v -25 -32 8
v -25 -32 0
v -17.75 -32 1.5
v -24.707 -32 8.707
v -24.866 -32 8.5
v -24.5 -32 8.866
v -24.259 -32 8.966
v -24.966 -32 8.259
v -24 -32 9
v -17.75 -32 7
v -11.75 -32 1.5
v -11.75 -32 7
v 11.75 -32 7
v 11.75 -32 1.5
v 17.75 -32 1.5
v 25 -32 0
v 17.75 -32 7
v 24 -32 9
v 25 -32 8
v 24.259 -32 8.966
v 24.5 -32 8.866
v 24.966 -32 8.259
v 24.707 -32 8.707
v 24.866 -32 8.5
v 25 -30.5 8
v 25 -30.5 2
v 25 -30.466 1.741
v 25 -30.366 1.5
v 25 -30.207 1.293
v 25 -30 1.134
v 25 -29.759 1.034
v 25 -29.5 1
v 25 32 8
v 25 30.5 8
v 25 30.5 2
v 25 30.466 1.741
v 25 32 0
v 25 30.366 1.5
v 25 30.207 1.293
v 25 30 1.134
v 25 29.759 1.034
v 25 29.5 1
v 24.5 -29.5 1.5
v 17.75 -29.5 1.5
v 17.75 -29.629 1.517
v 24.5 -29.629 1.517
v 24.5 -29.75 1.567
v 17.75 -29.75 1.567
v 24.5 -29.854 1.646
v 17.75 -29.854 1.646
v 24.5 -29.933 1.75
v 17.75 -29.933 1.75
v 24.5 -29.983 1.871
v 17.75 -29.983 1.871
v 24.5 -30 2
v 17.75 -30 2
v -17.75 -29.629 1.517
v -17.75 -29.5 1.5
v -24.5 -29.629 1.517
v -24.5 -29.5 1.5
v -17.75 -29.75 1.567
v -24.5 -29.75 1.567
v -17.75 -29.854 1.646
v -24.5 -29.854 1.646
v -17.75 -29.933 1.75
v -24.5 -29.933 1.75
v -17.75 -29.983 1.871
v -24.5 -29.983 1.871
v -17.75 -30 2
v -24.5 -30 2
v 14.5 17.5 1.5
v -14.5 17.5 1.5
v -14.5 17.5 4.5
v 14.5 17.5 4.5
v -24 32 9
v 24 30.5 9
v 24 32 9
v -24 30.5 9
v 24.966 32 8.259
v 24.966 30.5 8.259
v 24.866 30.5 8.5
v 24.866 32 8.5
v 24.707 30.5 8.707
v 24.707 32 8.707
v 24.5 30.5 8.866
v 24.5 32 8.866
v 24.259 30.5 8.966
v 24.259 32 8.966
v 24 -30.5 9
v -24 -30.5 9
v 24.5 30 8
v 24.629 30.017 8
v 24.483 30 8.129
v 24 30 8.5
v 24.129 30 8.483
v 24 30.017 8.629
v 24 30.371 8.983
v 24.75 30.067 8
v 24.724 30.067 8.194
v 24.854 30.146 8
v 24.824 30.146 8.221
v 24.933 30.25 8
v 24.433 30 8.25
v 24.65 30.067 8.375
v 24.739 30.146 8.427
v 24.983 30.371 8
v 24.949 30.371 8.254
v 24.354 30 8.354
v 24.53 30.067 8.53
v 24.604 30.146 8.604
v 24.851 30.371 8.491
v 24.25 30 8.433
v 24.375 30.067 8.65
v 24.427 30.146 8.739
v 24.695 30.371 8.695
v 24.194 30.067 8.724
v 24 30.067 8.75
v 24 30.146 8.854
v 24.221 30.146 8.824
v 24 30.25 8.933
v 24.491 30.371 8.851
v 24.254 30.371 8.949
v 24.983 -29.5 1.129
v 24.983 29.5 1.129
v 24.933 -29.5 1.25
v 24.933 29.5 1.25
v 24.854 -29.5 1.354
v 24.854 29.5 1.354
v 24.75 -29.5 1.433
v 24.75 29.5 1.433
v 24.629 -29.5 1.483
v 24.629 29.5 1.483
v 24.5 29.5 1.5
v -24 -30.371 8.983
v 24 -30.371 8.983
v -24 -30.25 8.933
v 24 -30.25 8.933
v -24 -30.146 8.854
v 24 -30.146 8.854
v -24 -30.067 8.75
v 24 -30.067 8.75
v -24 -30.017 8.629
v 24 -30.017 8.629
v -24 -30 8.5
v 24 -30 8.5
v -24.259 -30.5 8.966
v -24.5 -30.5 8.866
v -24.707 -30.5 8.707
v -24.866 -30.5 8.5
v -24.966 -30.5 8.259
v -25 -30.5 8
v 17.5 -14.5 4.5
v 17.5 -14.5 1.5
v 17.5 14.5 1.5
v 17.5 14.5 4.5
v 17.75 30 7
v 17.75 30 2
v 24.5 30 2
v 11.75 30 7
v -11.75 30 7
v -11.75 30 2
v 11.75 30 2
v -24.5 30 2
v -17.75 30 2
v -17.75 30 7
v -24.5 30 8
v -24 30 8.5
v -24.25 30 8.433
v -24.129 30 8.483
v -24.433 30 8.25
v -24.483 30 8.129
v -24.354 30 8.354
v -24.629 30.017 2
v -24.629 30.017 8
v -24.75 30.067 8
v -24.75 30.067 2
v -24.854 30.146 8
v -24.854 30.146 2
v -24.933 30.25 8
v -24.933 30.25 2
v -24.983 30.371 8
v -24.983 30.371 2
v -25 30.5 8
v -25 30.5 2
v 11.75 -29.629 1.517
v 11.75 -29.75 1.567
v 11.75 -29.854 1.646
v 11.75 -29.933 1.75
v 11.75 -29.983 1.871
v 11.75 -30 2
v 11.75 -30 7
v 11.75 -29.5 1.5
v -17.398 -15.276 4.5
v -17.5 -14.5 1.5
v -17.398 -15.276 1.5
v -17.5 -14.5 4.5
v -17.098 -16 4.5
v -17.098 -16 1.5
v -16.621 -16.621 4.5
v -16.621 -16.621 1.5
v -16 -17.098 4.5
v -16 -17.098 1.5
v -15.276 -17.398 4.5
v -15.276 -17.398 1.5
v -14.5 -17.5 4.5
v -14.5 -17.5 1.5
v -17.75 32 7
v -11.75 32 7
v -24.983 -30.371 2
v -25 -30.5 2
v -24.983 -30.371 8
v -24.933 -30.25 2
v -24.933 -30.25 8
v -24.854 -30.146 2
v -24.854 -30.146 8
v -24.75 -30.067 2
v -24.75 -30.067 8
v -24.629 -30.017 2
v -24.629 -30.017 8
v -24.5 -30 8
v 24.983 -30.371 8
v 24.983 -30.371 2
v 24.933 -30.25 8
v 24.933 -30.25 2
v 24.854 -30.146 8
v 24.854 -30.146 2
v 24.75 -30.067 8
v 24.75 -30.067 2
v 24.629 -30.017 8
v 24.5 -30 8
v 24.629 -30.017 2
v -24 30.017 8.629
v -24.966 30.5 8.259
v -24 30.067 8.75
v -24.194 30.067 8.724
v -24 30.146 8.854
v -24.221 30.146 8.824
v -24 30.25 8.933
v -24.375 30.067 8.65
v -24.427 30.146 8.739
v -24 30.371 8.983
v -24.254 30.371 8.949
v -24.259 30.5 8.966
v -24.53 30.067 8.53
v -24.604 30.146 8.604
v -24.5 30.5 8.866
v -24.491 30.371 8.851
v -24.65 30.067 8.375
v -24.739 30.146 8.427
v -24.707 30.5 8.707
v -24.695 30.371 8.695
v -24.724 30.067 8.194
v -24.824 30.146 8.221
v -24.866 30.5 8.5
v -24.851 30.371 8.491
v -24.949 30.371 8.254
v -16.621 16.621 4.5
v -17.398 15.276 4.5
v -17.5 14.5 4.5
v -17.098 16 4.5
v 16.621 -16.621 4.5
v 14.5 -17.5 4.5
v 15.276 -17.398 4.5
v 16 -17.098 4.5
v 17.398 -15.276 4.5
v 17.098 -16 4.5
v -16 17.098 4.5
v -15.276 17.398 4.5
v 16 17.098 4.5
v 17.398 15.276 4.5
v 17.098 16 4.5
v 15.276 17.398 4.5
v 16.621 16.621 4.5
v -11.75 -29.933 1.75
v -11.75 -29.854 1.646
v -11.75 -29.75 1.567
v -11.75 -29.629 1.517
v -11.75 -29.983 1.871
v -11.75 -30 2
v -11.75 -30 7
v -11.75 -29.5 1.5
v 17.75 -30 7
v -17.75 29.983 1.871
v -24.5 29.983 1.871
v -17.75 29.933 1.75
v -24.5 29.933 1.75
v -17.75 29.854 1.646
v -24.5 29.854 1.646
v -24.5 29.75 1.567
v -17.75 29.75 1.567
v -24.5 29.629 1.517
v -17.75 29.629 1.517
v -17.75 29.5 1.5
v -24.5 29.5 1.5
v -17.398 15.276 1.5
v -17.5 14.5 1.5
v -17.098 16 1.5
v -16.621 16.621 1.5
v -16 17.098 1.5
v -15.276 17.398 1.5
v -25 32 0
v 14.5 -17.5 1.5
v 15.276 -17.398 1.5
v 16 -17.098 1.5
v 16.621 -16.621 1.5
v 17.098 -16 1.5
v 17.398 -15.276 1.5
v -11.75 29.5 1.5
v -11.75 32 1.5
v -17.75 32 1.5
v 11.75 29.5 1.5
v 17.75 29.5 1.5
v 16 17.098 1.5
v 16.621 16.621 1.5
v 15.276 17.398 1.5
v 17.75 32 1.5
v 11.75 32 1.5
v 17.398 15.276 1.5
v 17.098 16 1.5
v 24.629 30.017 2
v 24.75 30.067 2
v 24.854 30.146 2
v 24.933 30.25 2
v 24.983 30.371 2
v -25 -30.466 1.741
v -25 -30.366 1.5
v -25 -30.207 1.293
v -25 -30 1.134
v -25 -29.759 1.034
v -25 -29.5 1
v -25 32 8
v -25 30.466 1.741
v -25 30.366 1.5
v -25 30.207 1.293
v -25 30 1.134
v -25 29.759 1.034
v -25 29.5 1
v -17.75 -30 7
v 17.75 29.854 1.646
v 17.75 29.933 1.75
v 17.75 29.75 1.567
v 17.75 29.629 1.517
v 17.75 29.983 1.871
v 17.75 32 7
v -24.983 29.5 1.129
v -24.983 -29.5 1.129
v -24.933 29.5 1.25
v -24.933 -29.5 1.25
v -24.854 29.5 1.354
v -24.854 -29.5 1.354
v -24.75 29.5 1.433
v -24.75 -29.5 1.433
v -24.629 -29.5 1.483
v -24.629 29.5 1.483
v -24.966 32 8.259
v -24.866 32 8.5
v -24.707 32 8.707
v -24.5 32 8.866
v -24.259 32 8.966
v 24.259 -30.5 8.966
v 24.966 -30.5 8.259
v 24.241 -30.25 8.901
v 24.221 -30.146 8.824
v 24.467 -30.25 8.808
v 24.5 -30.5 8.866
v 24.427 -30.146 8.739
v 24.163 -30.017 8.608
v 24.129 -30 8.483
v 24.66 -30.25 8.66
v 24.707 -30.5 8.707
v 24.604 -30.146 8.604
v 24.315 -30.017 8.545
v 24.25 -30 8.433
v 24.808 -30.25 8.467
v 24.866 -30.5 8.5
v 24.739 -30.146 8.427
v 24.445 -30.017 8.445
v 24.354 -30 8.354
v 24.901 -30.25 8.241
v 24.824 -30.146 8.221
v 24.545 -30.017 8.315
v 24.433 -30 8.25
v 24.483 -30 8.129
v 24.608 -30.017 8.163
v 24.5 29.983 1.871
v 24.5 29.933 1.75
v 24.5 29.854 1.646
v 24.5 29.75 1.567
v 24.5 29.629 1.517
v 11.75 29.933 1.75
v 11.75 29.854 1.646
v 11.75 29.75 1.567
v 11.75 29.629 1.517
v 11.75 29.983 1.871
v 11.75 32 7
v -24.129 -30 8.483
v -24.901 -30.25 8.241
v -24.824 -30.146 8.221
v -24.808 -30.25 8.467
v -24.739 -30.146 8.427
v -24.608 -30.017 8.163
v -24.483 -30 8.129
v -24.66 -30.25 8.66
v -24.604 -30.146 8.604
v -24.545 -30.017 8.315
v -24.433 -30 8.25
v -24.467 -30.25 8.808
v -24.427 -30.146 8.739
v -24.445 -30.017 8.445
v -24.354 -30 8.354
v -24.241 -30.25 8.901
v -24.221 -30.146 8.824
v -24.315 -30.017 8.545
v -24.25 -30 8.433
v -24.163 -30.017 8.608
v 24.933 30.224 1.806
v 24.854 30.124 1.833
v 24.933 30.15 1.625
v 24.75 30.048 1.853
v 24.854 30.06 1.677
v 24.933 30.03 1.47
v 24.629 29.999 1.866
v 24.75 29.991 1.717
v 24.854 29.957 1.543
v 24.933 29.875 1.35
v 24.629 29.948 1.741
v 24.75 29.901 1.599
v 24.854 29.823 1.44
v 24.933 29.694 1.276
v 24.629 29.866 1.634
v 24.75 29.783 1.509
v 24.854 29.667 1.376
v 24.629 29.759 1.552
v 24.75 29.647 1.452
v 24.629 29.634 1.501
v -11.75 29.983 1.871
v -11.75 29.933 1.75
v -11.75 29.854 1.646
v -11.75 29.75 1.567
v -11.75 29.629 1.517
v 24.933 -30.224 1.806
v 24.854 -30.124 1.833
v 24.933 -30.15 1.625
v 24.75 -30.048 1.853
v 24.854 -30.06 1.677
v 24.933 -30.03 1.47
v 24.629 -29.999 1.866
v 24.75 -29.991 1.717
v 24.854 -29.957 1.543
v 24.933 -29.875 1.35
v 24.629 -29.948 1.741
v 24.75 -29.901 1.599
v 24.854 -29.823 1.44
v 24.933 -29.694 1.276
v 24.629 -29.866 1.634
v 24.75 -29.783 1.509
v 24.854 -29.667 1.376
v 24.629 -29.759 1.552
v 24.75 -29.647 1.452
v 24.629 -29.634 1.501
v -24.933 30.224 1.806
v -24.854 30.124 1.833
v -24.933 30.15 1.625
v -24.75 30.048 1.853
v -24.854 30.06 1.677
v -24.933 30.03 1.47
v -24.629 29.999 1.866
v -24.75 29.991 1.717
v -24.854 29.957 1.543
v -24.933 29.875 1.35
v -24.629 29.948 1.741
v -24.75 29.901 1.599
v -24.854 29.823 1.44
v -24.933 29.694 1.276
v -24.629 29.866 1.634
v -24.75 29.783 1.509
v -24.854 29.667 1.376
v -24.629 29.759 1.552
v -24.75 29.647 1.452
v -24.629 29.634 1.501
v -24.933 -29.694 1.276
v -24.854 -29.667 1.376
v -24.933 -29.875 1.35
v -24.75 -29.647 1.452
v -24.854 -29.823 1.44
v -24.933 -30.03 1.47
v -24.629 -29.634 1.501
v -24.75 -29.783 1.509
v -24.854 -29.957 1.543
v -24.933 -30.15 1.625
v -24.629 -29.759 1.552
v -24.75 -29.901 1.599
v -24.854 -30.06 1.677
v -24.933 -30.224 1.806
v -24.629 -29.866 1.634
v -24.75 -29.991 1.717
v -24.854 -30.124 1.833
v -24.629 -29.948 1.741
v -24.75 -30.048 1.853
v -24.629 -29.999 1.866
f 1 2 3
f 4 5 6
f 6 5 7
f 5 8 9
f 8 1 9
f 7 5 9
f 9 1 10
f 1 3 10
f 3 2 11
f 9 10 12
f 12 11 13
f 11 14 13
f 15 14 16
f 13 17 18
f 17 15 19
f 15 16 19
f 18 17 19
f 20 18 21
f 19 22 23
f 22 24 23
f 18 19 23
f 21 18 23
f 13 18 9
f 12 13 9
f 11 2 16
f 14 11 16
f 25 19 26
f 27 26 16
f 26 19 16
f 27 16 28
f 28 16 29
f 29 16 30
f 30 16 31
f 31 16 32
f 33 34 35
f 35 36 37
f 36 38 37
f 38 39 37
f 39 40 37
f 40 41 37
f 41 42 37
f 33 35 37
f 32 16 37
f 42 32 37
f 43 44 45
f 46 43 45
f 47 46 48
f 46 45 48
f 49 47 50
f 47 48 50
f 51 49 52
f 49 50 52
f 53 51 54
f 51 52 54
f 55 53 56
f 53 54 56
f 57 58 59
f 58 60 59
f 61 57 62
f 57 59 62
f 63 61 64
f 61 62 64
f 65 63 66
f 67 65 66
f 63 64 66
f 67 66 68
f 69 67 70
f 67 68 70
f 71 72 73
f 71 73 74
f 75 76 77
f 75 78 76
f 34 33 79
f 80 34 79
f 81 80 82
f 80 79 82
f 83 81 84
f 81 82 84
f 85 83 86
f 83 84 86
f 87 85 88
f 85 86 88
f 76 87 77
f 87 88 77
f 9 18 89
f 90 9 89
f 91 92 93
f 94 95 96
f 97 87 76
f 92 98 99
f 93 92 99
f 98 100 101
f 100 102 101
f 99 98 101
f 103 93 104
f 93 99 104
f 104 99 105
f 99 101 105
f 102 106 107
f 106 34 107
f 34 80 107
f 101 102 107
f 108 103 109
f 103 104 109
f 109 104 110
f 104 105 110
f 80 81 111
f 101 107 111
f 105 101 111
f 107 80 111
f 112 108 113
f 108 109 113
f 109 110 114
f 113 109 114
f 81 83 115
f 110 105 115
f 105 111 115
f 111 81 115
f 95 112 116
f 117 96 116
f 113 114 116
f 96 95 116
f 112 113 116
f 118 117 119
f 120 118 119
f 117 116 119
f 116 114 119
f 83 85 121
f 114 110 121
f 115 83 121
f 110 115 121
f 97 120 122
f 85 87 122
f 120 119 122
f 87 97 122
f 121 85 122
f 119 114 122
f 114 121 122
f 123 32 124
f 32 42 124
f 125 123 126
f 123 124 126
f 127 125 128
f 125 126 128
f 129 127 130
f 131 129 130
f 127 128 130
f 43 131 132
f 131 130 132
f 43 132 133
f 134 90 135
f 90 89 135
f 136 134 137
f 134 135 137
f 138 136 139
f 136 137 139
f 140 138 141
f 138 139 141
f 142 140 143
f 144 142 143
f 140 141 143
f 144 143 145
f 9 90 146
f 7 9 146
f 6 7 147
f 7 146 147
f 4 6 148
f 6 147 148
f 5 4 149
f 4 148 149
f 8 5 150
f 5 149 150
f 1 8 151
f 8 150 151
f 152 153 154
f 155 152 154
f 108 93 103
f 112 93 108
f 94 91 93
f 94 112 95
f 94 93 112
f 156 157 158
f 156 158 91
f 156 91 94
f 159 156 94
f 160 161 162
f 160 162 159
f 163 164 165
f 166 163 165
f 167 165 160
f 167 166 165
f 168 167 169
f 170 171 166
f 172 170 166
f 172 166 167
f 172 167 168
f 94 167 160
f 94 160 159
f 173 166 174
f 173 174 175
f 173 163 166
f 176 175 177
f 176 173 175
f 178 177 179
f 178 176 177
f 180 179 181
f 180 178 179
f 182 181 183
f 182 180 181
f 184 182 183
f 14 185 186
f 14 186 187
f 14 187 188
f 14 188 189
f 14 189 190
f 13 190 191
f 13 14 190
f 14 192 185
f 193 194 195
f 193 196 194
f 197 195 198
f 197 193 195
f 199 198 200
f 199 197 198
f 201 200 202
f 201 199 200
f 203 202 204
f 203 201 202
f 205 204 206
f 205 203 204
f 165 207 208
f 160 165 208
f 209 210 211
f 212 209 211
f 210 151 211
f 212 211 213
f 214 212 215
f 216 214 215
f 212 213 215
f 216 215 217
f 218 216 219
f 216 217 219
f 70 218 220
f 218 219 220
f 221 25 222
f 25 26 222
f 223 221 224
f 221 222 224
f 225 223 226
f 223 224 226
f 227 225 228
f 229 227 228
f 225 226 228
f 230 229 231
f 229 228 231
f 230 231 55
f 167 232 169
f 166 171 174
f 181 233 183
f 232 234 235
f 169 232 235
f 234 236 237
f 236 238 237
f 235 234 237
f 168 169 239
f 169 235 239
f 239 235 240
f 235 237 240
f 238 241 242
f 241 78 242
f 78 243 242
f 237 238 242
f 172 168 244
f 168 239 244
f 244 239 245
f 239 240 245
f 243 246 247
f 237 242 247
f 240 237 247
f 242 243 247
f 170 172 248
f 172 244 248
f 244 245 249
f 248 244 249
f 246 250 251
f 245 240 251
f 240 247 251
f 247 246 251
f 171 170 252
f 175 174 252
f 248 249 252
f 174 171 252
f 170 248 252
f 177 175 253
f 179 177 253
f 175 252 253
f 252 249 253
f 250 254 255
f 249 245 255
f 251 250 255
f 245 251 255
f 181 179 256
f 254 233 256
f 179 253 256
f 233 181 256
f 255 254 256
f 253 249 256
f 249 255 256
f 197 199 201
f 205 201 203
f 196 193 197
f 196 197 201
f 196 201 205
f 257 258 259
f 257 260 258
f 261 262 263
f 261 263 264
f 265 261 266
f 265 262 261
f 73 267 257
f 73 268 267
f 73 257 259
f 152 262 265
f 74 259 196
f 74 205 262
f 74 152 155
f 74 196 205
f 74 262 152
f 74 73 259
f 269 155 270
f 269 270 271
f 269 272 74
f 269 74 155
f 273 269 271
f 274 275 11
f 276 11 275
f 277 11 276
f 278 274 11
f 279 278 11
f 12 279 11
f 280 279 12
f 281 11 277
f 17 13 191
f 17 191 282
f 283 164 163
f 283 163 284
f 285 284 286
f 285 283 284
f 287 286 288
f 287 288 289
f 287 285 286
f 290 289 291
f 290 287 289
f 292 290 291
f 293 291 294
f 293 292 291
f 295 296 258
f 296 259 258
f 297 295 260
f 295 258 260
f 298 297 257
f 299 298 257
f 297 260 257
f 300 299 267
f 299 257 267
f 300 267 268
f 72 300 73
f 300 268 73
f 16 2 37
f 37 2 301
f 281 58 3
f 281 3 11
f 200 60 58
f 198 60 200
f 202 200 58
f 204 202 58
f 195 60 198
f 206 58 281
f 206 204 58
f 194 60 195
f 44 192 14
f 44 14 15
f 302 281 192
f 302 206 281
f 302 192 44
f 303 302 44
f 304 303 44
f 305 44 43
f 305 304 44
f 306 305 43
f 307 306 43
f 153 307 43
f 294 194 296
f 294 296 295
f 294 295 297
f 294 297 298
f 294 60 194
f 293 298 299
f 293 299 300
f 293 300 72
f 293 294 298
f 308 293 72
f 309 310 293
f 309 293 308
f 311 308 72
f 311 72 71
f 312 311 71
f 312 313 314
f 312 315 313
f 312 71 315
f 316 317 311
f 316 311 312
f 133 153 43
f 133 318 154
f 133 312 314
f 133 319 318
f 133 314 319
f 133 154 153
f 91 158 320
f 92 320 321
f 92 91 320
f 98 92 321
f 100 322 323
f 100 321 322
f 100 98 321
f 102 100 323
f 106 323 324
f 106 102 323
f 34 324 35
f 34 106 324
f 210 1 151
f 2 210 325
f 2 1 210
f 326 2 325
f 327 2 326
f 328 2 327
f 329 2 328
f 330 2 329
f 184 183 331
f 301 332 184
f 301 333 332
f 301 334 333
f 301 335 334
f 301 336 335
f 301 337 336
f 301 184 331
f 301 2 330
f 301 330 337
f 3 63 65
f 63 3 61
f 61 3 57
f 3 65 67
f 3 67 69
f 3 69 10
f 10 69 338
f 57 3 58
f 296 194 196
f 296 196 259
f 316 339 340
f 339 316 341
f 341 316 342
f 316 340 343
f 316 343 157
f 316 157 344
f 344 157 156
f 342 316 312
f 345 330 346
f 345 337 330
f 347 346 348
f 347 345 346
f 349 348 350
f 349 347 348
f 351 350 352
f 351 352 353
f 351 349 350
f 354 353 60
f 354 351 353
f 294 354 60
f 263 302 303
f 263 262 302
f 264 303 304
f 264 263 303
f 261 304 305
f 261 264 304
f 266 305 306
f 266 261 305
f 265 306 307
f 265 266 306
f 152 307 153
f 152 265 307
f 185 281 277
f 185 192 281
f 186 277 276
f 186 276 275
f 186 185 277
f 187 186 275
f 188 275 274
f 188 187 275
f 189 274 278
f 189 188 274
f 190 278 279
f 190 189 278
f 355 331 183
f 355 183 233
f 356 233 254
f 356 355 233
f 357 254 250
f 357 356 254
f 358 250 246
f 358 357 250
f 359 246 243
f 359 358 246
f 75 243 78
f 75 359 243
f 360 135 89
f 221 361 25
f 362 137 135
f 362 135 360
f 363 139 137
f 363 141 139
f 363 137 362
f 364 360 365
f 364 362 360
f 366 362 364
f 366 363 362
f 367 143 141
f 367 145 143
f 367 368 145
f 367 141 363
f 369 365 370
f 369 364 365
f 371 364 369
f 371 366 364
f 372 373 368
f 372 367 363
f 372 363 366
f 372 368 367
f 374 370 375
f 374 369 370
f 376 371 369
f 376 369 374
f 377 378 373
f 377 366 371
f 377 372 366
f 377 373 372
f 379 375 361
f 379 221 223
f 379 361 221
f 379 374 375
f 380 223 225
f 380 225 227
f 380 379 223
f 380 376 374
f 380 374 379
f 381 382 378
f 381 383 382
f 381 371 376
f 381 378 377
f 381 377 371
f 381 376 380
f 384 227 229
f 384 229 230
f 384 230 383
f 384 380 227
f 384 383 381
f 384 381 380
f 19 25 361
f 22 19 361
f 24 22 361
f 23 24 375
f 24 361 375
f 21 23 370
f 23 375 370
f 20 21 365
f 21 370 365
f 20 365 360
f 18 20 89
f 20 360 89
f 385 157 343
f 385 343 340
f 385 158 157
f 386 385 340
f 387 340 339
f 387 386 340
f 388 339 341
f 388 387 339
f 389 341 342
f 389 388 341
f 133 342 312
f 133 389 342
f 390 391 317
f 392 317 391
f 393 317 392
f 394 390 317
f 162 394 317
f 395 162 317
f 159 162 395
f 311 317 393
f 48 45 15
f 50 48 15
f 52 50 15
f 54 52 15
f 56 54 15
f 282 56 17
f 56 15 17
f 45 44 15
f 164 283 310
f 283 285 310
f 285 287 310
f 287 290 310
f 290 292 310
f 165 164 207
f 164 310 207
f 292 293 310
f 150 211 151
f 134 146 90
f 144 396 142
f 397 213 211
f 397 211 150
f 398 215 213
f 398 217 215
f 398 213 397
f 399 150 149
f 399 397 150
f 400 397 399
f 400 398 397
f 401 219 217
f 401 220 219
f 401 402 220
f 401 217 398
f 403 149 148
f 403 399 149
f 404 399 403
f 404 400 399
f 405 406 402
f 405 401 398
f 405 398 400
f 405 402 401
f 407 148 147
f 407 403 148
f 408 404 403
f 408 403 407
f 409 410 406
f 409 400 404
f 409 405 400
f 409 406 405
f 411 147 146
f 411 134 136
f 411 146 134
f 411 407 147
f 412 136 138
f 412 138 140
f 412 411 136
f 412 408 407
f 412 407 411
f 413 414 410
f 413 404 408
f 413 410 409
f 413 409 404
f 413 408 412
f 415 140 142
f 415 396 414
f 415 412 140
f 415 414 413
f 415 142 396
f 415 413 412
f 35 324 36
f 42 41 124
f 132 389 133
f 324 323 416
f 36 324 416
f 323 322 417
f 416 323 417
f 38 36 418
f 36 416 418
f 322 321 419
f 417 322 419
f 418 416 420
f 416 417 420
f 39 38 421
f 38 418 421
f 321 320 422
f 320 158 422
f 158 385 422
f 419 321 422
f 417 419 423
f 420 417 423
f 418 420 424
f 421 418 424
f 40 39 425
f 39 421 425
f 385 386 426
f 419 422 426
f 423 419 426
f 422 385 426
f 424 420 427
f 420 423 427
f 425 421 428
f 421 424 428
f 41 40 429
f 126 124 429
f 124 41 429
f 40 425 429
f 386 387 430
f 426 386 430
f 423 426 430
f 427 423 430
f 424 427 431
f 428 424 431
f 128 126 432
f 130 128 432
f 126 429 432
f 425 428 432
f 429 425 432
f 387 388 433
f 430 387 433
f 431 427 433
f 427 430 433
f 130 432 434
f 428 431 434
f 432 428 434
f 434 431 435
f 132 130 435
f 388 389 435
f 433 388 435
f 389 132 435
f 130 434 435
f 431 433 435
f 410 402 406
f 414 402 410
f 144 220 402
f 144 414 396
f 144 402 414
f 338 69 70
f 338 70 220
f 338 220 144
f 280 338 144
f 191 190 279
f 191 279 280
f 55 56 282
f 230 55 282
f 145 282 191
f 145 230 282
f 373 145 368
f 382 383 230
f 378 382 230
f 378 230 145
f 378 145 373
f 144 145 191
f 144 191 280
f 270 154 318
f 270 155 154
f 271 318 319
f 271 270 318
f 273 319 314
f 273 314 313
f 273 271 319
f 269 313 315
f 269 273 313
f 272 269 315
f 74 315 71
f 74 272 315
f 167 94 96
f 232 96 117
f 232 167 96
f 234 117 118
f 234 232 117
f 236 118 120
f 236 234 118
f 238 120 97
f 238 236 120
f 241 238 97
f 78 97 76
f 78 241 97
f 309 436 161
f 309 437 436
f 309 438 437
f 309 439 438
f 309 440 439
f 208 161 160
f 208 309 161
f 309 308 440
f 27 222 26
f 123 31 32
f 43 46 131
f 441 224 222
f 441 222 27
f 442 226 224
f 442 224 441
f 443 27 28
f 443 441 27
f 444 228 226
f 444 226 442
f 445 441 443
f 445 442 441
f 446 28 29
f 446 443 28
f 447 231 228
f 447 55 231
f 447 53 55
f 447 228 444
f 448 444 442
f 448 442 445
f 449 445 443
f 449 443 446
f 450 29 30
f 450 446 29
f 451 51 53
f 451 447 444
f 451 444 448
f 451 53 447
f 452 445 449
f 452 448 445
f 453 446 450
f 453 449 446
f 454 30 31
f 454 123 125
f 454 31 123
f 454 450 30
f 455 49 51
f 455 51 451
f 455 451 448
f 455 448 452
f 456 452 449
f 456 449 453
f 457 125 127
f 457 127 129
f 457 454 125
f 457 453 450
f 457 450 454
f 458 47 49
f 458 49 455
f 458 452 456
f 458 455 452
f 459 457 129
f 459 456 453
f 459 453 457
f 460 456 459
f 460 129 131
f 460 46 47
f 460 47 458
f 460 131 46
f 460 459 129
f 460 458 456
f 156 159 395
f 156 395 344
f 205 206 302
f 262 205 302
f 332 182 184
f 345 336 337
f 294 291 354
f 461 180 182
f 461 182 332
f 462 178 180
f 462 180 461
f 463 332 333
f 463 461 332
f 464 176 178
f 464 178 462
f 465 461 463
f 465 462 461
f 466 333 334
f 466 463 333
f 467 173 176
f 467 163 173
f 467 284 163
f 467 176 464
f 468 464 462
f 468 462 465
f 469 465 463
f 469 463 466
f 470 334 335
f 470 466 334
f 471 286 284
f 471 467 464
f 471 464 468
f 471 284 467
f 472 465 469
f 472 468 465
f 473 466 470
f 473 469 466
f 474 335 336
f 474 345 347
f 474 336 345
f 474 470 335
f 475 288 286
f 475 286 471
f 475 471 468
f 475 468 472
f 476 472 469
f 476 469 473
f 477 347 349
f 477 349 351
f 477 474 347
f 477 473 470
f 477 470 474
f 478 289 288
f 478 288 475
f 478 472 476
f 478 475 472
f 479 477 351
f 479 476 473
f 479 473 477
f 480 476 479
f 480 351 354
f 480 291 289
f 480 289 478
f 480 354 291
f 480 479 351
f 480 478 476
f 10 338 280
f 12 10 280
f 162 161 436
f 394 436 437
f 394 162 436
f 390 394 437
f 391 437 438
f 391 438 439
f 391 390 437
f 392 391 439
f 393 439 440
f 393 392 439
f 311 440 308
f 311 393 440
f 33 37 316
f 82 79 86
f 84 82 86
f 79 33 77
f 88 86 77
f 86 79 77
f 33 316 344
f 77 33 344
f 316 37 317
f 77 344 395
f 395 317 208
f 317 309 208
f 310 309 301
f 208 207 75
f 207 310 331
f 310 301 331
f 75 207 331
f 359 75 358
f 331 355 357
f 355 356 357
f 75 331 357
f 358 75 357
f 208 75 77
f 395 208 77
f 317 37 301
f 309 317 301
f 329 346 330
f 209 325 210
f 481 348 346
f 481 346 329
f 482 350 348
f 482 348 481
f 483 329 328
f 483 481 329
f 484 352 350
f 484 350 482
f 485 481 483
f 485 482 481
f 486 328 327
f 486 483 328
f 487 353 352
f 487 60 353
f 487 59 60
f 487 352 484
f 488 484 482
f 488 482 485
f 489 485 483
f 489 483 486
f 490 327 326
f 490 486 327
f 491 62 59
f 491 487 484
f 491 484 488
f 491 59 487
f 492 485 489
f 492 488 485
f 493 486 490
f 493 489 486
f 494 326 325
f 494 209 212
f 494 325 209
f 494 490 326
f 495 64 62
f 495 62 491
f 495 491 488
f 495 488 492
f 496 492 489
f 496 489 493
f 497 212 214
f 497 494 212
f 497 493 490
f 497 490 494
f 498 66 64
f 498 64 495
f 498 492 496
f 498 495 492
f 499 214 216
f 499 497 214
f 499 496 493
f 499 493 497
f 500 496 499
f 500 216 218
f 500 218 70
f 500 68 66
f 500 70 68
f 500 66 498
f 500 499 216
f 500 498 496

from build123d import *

# Parameters (mm, degrees)
F0_W      = 50
F0_H      = 60
F1_DEPTH  = 1.5
F2_W      = 20
F2_H      = 2
F3_DEPTH  = 9
F4_W      = 6
F4_H      = 5.5
F5_DEPTH  = 32
F6_W      = 35
F6_H      = 35
F7_DEPTH  = 4.5
F8_R      = 3
F9_DEPTH  = 5
F10_DEPTH = 5
F11_DEPTH = 5
F12_DEPTH = 5
F13_R     = 1
F14_R     = 0.5


with BuildPart() as f1:
    # F0 (on Top) → F1 (new body)
    with BuildSketch(Plane.XY):
        Rectangle(F0_W, F0_H)
    extrude(amount=F1_DEPTH)

    # F2 (on Top) → F3 (join)
    with BuildSketch(Plane.XY):
        with Locations((10, 31)):
            Rectangle(F2_W, F2_H)
        with Locations((-10, 31)):
            Rectangle(F2_W, F2_H)
        with Locations((-10, -31)):
            Rectangle(F2_W, F2_H)
        with Locations((10, -31)):
            Rectangle(F2_W, F2_H)
    extrude(amount=F3_DEPTH)

    # F4 (on Front) → F5 (cut, symmetric)
    with BuildSketch(Plane.XZ):
        with Locations((-14.75, 4.25)):
            Rectangle(F4_W, F4_H)
        with Locations((14.75, 4.25)):
            Rectangle(F4_W, F4_H)
    extrude(amount=F5_DEPTH, both=True, mode=Mode.SUBTRACT)

    # F6 (on Top) → F7 (join)
    with BuildSketch(Plane.XY):
        Rectangle(F6_W, F6_H)
    extrude(amount=F7_DEPTH)

    # F8
    f8_edges = [f1.edges().sort_by_distance(p)[0] for p in [
        (17.5, -17.5, 3),
        (-17.5, -17.5, 3),
        (-17.5, 17.5, 3),
        (17.5, 17.5, 3),
    ]]
    fillet(f8_edges, radius=F8_R)

    # F9 (add): a face of the model
    f9_faces = [f1.faces().sort_by_distance(p)[0] for p in [
        (20, -31, 4.5),
    ]]
    extrude(f9_faces, amount=F9_DEPTH)

    # F10 (add): a face of the model
    f10_faces = [f1.faces().sort_by_distance(p)[0] for p in [
        (-20, 31, 4.5),
    ]]
    extrude(f10_faces, amount=F10_DEPTH)

    # F11 (add): a face of the model
    f11_faces = [f1.faces().sort_by_distance(p)[0] for p in [
        (-20, -31, 4.5),
    ]]
    extrude(f11_faces, amount=F11_DEPTH)

    # F12 (add): a face of the model
    f12_faces = [f1.faces().sort_by_distance(p)[0] for p in [
        (20, 31, 4.5),
    ]]
    extrude(f12_faces, amount=F12_DEPTH)

    # F13
    f13_edges = [f1.edges().sort_by_distance(p)[0] for p in [
        (25, 31, 9),
        (-25, -31, 9),
        (-25, 31, 9),
        (25, -31, 9),
    ]]
    fillet(f13_edges, radius=F13_R)

    # F14
    f14_edges = [f1.edges().sort_by_distance(p)[0] for p in [
        (-21.375, 30, 1.5),
        (21.375, 30, 1.5),
        (0, 30, 1.5),
        (-21.375, -30, 1.5),
        (0, -30, 1.5),
        (21.375, -30, 1.5),
        (0, 30, 9),
        (-24.707107, 30, 8.707107),
        (24.707107, 30, 8.707107),
        (-25, 30, 4.75),
        (-25, 0, 1.5),
        (-25, -30, 4.75),
        (25, -30, 4.75),
        (25, 0, 1.5),
        (25, 30, 4.75),
        (-24.707107, -30, 8.707107),
        (0, -30, 9),
        (24.707107, -30, 8.707107),
    ]]
    fillet(f14_edges, radius=F14_R)


solid = f1.part
